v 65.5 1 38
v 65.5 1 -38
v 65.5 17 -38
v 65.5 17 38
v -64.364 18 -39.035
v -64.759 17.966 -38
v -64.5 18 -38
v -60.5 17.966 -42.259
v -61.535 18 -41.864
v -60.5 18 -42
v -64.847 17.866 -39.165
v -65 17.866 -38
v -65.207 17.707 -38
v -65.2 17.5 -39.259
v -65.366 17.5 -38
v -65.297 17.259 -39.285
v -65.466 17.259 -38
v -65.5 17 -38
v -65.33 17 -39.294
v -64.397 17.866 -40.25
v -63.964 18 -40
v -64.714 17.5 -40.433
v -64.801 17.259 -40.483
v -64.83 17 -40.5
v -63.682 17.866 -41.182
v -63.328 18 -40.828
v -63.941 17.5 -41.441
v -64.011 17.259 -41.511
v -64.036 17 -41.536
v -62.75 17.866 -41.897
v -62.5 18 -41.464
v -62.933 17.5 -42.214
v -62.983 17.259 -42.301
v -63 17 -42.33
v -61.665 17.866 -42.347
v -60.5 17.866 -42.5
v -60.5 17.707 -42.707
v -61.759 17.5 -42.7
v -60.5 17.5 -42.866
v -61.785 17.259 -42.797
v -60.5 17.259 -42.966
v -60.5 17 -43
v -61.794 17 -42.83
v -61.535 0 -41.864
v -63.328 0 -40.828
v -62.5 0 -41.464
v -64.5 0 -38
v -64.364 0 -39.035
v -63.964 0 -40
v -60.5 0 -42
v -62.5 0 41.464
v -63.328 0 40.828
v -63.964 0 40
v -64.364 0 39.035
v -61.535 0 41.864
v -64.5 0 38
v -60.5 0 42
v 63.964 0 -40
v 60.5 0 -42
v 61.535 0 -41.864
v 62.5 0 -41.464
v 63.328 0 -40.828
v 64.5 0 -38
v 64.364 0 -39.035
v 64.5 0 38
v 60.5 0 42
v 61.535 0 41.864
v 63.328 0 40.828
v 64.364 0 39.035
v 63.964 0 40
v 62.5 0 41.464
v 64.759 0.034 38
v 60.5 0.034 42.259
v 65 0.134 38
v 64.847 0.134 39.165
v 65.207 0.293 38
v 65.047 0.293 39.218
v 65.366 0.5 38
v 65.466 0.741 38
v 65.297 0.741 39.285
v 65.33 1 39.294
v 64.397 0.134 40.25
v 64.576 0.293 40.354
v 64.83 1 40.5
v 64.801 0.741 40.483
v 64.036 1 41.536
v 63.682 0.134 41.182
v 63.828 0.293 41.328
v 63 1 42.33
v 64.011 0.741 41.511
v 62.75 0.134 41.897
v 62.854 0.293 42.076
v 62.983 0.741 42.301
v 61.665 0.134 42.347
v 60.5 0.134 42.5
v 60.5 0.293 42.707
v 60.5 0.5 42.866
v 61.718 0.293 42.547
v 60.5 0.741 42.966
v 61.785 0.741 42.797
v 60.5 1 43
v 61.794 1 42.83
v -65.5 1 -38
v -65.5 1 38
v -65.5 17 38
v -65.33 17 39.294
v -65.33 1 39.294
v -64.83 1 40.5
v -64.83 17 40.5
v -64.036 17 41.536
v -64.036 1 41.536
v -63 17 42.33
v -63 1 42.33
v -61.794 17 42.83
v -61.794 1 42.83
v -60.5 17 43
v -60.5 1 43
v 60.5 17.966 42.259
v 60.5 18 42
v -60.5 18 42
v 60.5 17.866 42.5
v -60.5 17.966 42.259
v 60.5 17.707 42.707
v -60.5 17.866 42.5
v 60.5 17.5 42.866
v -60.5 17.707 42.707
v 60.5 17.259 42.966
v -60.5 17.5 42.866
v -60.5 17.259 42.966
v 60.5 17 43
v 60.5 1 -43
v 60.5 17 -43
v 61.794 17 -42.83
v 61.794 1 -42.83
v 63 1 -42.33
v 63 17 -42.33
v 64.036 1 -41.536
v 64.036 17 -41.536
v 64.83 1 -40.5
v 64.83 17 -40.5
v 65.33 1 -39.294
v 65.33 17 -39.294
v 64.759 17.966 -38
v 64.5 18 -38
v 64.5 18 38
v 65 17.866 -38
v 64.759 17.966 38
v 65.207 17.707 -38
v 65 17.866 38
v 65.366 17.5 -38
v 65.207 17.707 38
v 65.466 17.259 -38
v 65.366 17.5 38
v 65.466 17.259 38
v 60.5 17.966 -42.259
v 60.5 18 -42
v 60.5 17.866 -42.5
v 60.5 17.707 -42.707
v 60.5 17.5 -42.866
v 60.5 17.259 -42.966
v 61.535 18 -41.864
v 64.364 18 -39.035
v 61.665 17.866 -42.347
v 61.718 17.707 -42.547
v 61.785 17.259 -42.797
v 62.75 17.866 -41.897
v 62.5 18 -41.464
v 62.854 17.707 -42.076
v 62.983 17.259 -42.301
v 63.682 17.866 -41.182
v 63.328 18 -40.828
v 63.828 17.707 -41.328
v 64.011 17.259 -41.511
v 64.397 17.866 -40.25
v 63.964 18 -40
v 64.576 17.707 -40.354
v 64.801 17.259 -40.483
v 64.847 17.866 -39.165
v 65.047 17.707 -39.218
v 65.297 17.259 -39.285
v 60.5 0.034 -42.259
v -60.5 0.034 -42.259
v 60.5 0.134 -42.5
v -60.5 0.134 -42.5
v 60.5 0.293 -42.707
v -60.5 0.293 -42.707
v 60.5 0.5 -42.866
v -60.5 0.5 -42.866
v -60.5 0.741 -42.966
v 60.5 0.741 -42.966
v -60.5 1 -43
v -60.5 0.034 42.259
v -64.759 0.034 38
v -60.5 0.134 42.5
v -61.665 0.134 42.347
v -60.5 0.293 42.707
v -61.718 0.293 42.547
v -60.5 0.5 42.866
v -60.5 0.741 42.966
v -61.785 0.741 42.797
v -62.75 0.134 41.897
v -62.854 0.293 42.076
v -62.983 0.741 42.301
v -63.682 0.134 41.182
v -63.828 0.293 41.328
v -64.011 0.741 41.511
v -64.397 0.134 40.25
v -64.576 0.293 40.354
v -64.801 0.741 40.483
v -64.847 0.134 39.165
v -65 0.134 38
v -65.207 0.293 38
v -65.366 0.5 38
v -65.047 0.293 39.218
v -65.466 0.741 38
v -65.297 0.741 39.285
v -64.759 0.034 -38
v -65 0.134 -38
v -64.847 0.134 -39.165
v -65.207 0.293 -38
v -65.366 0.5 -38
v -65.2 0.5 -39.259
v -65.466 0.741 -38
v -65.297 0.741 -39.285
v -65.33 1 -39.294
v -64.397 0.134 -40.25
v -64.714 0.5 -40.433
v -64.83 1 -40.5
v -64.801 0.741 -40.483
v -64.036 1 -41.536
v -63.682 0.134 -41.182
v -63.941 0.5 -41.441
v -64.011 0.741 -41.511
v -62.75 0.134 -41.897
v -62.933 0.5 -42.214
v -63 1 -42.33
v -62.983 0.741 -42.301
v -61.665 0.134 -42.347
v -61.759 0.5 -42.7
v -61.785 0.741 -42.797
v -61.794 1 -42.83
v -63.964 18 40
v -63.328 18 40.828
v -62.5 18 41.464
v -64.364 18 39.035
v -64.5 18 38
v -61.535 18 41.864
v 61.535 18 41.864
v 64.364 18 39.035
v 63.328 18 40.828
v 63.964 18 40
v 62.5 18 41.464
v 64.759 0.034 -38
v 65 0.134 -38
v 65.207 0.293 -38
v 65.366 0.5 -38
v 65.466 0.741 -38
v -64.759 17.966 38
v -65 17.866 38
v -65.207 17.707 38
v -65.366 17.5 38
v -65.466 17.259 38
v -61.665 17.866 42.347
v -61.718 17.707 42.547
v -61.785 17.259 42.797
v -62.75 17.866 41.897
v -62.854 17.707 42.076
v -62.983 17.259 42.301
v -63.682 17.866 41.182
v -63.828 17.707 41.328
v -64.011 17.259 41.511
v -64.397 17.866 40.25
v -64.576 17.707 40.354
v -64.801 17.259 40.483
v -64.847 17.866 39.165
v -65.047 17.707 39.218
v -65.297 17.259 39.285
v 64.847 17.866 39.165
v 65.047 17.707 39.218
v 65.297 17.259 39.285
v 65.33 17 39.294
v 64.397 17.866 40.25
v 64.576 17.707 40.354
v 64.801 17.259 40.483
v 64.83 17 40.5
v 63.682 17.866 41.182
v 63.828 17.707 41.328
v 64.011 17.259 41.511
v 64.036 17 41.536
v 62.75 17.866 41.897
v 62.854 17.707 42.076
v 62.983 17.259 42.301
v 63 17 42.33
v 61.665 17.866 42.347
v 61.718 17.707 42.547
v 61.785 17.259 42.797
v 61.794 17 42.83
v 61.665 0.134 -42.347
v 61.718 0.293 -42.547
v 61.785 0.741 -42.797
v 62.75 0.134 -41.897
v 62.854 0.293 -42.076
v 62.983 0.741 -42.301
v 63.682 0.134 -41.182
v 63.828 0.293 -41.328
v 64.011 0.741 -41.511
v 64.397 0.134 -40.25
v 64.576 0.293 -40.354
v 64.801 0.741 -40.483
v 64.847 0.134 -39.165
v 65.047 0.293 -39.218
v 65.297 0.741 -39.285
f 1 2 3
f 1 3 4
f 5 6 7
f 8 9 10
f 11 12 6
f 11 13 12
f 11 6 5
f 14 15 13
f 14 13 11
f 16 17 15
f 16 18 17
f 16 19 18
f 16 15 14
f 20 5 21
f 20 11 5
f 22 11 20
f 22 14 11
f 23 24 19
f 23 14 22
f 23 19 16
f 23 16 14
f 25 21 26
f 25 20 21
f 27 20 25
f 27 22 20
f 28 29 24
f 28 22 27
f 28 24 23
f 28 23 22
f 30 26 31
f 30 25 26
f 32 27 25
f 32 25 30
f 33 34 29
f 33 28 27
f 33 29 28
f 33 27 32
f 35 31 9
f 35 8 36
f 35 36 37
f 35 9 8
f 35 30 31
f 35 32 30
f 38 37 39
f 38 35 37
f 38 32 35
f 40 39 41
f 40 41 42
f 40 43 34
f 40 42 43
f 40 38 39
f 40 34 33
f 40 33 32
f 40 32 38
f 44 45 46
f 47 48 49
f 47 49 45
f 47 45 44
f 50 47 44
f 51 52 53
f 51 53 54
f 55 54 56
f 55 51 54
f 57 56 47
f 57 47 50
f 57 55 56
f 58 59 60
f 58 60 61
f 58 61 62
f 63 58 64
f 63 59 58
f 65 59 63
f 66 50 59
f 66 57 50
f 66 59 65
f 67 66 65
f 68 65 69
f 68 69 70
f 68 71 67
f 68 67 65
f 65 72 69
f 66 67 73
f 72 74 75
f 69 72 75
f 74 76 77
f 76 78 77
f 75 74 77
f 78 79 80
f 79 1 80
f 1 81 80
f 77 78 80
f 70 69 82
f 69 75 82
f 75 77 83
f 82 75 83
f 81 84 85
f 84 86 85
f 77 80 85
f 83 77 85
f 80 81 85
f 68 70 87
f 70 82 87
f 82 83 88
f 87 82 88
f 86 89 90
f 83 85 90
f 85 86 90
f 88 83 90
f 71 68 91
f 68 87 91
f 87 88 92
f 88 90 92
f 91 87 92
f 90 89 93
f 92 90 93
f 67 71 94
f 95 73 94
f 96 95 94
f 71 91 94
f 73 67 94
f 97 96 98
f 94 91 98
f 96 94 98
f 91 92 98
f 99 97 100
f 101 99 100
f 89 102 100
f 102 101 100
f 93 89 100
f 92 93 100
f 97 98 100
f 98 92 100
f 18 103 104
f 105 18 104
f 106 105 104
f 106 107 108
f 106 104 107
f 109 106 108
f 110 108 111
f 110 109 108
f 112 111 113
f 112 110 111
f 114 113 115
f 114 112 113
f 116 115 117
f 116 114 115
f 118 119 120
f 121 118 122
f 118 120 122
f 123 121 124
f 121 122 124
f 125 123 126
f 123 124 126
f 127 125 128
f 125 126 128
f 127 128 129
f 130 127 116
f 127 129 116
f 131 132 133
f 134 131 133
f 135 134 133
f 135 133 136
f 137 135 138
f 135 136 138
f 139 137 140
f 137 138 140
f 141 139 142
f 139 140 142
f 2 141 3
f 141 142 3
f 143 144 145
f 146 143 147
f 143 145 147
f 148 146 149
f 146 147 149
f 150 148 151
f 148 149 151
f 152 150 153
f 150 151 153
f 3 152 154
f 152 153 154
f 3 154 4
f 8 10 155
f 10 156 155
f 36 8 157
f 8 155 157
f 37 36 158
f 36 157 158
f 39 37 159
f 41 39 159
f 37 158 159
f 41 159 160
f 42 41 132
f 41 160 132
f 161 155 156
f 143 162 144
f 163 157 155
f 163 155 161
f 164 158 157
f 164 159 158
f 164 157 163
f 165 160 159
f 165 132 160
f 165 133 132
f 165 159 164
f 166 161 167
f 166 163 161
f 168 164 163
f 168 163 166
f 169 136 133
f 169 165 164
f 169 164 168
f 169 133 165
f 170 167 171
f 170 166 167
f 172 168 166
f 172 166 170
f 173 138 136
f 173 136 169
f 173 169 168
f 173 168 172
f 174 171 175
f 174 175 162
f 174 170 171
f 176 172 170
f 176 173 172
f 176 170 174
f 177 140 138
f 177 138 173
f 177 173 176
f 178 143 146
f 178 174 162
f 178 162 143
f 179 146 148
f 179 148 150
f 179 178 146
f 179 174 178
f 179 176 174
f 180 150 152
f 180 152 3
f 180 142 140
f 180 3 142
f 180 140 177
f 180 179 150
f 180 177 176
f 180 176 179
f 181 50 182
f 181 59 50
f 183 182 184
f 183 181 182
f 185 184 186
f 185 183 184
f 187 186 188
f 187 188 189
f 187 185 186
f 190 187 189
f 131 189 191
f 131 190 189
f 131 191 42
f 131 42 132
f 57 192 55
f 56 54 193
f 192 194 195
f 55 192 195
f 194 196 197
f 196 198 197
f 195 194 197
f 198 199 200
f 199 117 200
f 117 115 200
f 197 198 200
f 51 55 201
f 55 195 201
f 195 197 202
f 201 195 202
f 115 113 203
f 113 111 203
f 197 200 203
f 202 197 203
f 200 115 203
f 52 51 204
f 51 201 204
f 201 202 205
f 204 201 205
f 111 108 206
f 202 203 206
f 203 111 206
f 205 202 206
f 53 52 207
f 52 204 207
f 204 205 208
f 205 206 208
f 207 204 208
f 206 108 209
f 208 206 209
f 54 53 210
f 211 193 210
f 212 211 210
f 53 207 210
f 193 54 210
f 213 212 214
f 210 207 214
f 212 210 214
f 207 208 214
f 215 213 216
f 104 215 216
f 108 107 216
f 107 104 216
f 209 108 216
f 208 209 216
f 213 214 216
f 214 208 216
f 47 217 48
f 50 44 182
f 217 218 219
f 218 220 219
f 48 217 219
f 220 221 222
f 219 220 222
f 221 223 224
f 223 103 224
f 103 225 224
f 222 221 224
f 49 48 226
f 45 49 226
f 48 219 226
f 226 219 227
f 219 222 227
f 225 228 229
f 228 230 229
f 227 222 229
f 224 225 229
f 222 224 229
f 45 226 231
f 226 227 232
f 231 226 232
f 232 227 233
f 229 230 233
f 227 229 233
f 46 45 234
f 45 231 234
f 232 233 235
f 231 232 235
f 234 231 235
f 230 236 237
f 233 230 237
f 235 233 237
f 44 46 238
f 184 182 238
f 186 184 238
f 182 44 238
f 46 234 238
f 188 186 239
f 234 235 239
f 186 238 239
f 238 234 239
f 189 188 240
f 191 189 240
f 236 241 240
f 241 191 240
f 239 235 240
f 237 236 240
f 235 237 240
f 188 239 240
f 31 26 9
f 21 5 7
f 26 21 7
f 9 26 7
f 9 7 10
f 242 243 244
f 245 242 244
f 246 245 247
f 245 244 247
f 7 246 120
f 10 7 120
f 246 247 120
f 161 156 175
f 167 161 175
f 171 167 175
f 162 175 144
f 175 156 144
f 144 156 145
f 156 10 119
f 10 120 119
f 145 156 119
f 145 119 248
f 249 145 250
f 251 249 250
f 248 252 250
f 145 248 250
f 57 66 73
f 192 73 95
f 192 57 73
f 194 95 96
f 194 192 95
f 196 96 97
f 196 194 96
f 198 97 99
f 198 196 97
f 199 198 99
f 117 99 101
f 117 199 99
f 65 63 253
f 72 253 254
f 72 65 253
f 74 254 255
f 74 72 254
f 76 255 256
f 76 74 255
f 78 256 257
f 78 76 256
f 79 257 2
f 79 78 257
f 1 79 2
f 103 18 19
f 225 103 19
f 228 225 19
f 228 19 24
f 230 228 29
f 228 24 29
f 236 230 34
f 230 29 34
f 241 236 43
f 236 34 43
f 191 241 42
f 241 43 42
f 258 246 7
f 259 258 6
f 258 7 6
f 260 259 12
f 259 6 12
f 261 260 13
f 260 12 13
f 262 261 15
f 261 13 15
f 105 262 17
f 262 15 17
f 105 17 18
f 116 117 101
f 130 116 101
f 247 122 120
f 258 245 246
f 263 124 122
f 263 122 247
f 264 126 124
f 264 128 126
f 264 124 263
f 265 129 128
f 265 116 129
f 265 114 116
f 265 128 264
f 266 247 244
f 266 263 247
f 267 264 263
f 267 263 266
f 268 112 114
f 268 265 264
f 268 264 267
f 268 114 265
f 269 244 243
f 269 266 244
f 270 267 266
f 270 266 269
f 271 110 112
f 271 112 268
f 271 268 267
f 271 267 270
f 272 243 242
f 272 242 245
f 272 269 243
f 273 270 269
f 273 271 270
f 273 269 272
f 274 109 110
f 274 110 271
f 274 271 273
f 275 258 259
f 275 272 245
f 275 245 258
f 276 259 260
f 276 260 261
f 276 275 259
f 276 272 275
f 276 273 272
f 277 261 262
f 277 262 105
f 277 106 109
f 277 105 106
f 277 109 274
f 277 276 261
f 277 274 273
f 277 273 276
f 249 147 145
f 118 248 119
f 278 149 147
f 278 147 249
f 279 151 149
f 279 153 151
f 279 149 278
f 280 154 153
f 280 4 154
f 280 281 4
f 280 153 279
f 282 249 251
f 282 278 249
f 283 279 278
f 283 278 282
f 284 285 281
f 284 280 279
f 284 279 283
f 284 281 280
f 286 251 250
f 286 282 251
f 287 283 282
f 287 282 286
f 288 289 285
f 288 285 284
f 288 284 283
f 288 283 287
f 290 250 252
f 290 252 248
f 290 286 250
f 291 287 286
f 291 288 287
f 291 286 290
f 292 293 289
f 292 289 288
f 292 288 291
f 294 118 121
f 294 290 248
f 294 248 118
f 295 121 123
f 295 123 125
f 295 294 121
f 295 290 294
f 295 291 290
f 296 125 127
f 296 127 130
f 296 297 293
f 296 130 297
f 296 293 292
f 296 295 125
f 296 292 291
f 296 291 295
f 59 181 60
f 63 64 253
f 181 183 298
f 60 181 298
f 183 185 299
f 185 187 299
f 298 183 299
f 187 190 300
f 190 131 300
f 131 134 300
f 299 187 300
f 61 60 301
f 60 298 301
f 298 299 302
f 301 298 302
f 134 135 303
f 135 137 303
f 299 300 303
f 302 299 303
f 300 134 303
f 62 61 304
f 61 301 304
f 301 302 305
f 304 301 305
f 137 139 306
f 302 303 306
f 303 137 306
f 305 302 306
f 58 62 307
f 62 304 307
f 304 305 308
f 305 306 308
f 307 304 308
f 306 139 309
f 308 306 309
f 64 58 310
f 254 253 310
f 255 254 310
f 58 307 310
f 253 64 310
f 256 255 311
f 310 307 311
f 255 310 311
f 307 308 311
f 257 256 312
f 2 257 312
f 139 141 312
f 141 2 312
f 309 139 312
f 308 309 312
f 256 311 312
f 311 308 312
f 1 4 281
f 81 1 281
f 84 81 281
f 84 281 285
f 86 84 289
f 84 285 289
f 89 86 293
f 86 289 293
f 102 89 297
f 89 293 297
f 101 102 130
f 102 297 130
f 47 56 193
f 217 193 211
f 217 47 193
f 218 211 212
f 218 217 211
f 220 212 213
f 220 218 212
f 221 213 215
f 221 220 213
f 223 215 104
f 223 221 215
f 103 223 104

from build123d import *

# Parameters (mm, degrees)
F0_W     = 131
F0_H     = 86
F1_DEPTH = 18
F2_R     = 5
F3_R     = 1


with BuildPart() as f1:
    # F0 (on Front) → F1 (new body)
    with BuildSketch(Plane.XZ):
        Rectangle(F0_W, F0_H)
    extrude(amount=-F1_DEPTH)

    # F2
    f2_edges = [f1.edges().sort_by_distance(p)[0] for p in [
        (-65.5, 9, 43),
        (65.5, 9, 43),
        (65.5, 9, -43),
        (-65.5, 9, -43),
    ]]
    fillet(f2_edges, radius=F2_R)

    # F3
    f3_edges = [f1.edges().sort_by_distance(p)[0] for p in [
        (0, 18, -43),
        (-64.035534, 18, -41.535534),
        (64.035534, 18, -41.535534),
        (-65.5, 18, 0),
        (65.5, 18, 0),
        (-64.035534, 18, 41.535534),
        (64.035534, 18, 41.535534),
        (0, 18, 43),
        (0, 0, -43),
        (-64.035534, 0, -41.535534),
        (64.035534, 0, -41.535534),
        (-65.5, 0, 0),
        (65.5, 0, 0),
        (-64.035534, 0, 41.535534),
        (64.035534, 0, 41.535534),
        (0, 0, 43),
    ]]
    fillet(f3_edges, radius=F3_R)


solid = f1.part
